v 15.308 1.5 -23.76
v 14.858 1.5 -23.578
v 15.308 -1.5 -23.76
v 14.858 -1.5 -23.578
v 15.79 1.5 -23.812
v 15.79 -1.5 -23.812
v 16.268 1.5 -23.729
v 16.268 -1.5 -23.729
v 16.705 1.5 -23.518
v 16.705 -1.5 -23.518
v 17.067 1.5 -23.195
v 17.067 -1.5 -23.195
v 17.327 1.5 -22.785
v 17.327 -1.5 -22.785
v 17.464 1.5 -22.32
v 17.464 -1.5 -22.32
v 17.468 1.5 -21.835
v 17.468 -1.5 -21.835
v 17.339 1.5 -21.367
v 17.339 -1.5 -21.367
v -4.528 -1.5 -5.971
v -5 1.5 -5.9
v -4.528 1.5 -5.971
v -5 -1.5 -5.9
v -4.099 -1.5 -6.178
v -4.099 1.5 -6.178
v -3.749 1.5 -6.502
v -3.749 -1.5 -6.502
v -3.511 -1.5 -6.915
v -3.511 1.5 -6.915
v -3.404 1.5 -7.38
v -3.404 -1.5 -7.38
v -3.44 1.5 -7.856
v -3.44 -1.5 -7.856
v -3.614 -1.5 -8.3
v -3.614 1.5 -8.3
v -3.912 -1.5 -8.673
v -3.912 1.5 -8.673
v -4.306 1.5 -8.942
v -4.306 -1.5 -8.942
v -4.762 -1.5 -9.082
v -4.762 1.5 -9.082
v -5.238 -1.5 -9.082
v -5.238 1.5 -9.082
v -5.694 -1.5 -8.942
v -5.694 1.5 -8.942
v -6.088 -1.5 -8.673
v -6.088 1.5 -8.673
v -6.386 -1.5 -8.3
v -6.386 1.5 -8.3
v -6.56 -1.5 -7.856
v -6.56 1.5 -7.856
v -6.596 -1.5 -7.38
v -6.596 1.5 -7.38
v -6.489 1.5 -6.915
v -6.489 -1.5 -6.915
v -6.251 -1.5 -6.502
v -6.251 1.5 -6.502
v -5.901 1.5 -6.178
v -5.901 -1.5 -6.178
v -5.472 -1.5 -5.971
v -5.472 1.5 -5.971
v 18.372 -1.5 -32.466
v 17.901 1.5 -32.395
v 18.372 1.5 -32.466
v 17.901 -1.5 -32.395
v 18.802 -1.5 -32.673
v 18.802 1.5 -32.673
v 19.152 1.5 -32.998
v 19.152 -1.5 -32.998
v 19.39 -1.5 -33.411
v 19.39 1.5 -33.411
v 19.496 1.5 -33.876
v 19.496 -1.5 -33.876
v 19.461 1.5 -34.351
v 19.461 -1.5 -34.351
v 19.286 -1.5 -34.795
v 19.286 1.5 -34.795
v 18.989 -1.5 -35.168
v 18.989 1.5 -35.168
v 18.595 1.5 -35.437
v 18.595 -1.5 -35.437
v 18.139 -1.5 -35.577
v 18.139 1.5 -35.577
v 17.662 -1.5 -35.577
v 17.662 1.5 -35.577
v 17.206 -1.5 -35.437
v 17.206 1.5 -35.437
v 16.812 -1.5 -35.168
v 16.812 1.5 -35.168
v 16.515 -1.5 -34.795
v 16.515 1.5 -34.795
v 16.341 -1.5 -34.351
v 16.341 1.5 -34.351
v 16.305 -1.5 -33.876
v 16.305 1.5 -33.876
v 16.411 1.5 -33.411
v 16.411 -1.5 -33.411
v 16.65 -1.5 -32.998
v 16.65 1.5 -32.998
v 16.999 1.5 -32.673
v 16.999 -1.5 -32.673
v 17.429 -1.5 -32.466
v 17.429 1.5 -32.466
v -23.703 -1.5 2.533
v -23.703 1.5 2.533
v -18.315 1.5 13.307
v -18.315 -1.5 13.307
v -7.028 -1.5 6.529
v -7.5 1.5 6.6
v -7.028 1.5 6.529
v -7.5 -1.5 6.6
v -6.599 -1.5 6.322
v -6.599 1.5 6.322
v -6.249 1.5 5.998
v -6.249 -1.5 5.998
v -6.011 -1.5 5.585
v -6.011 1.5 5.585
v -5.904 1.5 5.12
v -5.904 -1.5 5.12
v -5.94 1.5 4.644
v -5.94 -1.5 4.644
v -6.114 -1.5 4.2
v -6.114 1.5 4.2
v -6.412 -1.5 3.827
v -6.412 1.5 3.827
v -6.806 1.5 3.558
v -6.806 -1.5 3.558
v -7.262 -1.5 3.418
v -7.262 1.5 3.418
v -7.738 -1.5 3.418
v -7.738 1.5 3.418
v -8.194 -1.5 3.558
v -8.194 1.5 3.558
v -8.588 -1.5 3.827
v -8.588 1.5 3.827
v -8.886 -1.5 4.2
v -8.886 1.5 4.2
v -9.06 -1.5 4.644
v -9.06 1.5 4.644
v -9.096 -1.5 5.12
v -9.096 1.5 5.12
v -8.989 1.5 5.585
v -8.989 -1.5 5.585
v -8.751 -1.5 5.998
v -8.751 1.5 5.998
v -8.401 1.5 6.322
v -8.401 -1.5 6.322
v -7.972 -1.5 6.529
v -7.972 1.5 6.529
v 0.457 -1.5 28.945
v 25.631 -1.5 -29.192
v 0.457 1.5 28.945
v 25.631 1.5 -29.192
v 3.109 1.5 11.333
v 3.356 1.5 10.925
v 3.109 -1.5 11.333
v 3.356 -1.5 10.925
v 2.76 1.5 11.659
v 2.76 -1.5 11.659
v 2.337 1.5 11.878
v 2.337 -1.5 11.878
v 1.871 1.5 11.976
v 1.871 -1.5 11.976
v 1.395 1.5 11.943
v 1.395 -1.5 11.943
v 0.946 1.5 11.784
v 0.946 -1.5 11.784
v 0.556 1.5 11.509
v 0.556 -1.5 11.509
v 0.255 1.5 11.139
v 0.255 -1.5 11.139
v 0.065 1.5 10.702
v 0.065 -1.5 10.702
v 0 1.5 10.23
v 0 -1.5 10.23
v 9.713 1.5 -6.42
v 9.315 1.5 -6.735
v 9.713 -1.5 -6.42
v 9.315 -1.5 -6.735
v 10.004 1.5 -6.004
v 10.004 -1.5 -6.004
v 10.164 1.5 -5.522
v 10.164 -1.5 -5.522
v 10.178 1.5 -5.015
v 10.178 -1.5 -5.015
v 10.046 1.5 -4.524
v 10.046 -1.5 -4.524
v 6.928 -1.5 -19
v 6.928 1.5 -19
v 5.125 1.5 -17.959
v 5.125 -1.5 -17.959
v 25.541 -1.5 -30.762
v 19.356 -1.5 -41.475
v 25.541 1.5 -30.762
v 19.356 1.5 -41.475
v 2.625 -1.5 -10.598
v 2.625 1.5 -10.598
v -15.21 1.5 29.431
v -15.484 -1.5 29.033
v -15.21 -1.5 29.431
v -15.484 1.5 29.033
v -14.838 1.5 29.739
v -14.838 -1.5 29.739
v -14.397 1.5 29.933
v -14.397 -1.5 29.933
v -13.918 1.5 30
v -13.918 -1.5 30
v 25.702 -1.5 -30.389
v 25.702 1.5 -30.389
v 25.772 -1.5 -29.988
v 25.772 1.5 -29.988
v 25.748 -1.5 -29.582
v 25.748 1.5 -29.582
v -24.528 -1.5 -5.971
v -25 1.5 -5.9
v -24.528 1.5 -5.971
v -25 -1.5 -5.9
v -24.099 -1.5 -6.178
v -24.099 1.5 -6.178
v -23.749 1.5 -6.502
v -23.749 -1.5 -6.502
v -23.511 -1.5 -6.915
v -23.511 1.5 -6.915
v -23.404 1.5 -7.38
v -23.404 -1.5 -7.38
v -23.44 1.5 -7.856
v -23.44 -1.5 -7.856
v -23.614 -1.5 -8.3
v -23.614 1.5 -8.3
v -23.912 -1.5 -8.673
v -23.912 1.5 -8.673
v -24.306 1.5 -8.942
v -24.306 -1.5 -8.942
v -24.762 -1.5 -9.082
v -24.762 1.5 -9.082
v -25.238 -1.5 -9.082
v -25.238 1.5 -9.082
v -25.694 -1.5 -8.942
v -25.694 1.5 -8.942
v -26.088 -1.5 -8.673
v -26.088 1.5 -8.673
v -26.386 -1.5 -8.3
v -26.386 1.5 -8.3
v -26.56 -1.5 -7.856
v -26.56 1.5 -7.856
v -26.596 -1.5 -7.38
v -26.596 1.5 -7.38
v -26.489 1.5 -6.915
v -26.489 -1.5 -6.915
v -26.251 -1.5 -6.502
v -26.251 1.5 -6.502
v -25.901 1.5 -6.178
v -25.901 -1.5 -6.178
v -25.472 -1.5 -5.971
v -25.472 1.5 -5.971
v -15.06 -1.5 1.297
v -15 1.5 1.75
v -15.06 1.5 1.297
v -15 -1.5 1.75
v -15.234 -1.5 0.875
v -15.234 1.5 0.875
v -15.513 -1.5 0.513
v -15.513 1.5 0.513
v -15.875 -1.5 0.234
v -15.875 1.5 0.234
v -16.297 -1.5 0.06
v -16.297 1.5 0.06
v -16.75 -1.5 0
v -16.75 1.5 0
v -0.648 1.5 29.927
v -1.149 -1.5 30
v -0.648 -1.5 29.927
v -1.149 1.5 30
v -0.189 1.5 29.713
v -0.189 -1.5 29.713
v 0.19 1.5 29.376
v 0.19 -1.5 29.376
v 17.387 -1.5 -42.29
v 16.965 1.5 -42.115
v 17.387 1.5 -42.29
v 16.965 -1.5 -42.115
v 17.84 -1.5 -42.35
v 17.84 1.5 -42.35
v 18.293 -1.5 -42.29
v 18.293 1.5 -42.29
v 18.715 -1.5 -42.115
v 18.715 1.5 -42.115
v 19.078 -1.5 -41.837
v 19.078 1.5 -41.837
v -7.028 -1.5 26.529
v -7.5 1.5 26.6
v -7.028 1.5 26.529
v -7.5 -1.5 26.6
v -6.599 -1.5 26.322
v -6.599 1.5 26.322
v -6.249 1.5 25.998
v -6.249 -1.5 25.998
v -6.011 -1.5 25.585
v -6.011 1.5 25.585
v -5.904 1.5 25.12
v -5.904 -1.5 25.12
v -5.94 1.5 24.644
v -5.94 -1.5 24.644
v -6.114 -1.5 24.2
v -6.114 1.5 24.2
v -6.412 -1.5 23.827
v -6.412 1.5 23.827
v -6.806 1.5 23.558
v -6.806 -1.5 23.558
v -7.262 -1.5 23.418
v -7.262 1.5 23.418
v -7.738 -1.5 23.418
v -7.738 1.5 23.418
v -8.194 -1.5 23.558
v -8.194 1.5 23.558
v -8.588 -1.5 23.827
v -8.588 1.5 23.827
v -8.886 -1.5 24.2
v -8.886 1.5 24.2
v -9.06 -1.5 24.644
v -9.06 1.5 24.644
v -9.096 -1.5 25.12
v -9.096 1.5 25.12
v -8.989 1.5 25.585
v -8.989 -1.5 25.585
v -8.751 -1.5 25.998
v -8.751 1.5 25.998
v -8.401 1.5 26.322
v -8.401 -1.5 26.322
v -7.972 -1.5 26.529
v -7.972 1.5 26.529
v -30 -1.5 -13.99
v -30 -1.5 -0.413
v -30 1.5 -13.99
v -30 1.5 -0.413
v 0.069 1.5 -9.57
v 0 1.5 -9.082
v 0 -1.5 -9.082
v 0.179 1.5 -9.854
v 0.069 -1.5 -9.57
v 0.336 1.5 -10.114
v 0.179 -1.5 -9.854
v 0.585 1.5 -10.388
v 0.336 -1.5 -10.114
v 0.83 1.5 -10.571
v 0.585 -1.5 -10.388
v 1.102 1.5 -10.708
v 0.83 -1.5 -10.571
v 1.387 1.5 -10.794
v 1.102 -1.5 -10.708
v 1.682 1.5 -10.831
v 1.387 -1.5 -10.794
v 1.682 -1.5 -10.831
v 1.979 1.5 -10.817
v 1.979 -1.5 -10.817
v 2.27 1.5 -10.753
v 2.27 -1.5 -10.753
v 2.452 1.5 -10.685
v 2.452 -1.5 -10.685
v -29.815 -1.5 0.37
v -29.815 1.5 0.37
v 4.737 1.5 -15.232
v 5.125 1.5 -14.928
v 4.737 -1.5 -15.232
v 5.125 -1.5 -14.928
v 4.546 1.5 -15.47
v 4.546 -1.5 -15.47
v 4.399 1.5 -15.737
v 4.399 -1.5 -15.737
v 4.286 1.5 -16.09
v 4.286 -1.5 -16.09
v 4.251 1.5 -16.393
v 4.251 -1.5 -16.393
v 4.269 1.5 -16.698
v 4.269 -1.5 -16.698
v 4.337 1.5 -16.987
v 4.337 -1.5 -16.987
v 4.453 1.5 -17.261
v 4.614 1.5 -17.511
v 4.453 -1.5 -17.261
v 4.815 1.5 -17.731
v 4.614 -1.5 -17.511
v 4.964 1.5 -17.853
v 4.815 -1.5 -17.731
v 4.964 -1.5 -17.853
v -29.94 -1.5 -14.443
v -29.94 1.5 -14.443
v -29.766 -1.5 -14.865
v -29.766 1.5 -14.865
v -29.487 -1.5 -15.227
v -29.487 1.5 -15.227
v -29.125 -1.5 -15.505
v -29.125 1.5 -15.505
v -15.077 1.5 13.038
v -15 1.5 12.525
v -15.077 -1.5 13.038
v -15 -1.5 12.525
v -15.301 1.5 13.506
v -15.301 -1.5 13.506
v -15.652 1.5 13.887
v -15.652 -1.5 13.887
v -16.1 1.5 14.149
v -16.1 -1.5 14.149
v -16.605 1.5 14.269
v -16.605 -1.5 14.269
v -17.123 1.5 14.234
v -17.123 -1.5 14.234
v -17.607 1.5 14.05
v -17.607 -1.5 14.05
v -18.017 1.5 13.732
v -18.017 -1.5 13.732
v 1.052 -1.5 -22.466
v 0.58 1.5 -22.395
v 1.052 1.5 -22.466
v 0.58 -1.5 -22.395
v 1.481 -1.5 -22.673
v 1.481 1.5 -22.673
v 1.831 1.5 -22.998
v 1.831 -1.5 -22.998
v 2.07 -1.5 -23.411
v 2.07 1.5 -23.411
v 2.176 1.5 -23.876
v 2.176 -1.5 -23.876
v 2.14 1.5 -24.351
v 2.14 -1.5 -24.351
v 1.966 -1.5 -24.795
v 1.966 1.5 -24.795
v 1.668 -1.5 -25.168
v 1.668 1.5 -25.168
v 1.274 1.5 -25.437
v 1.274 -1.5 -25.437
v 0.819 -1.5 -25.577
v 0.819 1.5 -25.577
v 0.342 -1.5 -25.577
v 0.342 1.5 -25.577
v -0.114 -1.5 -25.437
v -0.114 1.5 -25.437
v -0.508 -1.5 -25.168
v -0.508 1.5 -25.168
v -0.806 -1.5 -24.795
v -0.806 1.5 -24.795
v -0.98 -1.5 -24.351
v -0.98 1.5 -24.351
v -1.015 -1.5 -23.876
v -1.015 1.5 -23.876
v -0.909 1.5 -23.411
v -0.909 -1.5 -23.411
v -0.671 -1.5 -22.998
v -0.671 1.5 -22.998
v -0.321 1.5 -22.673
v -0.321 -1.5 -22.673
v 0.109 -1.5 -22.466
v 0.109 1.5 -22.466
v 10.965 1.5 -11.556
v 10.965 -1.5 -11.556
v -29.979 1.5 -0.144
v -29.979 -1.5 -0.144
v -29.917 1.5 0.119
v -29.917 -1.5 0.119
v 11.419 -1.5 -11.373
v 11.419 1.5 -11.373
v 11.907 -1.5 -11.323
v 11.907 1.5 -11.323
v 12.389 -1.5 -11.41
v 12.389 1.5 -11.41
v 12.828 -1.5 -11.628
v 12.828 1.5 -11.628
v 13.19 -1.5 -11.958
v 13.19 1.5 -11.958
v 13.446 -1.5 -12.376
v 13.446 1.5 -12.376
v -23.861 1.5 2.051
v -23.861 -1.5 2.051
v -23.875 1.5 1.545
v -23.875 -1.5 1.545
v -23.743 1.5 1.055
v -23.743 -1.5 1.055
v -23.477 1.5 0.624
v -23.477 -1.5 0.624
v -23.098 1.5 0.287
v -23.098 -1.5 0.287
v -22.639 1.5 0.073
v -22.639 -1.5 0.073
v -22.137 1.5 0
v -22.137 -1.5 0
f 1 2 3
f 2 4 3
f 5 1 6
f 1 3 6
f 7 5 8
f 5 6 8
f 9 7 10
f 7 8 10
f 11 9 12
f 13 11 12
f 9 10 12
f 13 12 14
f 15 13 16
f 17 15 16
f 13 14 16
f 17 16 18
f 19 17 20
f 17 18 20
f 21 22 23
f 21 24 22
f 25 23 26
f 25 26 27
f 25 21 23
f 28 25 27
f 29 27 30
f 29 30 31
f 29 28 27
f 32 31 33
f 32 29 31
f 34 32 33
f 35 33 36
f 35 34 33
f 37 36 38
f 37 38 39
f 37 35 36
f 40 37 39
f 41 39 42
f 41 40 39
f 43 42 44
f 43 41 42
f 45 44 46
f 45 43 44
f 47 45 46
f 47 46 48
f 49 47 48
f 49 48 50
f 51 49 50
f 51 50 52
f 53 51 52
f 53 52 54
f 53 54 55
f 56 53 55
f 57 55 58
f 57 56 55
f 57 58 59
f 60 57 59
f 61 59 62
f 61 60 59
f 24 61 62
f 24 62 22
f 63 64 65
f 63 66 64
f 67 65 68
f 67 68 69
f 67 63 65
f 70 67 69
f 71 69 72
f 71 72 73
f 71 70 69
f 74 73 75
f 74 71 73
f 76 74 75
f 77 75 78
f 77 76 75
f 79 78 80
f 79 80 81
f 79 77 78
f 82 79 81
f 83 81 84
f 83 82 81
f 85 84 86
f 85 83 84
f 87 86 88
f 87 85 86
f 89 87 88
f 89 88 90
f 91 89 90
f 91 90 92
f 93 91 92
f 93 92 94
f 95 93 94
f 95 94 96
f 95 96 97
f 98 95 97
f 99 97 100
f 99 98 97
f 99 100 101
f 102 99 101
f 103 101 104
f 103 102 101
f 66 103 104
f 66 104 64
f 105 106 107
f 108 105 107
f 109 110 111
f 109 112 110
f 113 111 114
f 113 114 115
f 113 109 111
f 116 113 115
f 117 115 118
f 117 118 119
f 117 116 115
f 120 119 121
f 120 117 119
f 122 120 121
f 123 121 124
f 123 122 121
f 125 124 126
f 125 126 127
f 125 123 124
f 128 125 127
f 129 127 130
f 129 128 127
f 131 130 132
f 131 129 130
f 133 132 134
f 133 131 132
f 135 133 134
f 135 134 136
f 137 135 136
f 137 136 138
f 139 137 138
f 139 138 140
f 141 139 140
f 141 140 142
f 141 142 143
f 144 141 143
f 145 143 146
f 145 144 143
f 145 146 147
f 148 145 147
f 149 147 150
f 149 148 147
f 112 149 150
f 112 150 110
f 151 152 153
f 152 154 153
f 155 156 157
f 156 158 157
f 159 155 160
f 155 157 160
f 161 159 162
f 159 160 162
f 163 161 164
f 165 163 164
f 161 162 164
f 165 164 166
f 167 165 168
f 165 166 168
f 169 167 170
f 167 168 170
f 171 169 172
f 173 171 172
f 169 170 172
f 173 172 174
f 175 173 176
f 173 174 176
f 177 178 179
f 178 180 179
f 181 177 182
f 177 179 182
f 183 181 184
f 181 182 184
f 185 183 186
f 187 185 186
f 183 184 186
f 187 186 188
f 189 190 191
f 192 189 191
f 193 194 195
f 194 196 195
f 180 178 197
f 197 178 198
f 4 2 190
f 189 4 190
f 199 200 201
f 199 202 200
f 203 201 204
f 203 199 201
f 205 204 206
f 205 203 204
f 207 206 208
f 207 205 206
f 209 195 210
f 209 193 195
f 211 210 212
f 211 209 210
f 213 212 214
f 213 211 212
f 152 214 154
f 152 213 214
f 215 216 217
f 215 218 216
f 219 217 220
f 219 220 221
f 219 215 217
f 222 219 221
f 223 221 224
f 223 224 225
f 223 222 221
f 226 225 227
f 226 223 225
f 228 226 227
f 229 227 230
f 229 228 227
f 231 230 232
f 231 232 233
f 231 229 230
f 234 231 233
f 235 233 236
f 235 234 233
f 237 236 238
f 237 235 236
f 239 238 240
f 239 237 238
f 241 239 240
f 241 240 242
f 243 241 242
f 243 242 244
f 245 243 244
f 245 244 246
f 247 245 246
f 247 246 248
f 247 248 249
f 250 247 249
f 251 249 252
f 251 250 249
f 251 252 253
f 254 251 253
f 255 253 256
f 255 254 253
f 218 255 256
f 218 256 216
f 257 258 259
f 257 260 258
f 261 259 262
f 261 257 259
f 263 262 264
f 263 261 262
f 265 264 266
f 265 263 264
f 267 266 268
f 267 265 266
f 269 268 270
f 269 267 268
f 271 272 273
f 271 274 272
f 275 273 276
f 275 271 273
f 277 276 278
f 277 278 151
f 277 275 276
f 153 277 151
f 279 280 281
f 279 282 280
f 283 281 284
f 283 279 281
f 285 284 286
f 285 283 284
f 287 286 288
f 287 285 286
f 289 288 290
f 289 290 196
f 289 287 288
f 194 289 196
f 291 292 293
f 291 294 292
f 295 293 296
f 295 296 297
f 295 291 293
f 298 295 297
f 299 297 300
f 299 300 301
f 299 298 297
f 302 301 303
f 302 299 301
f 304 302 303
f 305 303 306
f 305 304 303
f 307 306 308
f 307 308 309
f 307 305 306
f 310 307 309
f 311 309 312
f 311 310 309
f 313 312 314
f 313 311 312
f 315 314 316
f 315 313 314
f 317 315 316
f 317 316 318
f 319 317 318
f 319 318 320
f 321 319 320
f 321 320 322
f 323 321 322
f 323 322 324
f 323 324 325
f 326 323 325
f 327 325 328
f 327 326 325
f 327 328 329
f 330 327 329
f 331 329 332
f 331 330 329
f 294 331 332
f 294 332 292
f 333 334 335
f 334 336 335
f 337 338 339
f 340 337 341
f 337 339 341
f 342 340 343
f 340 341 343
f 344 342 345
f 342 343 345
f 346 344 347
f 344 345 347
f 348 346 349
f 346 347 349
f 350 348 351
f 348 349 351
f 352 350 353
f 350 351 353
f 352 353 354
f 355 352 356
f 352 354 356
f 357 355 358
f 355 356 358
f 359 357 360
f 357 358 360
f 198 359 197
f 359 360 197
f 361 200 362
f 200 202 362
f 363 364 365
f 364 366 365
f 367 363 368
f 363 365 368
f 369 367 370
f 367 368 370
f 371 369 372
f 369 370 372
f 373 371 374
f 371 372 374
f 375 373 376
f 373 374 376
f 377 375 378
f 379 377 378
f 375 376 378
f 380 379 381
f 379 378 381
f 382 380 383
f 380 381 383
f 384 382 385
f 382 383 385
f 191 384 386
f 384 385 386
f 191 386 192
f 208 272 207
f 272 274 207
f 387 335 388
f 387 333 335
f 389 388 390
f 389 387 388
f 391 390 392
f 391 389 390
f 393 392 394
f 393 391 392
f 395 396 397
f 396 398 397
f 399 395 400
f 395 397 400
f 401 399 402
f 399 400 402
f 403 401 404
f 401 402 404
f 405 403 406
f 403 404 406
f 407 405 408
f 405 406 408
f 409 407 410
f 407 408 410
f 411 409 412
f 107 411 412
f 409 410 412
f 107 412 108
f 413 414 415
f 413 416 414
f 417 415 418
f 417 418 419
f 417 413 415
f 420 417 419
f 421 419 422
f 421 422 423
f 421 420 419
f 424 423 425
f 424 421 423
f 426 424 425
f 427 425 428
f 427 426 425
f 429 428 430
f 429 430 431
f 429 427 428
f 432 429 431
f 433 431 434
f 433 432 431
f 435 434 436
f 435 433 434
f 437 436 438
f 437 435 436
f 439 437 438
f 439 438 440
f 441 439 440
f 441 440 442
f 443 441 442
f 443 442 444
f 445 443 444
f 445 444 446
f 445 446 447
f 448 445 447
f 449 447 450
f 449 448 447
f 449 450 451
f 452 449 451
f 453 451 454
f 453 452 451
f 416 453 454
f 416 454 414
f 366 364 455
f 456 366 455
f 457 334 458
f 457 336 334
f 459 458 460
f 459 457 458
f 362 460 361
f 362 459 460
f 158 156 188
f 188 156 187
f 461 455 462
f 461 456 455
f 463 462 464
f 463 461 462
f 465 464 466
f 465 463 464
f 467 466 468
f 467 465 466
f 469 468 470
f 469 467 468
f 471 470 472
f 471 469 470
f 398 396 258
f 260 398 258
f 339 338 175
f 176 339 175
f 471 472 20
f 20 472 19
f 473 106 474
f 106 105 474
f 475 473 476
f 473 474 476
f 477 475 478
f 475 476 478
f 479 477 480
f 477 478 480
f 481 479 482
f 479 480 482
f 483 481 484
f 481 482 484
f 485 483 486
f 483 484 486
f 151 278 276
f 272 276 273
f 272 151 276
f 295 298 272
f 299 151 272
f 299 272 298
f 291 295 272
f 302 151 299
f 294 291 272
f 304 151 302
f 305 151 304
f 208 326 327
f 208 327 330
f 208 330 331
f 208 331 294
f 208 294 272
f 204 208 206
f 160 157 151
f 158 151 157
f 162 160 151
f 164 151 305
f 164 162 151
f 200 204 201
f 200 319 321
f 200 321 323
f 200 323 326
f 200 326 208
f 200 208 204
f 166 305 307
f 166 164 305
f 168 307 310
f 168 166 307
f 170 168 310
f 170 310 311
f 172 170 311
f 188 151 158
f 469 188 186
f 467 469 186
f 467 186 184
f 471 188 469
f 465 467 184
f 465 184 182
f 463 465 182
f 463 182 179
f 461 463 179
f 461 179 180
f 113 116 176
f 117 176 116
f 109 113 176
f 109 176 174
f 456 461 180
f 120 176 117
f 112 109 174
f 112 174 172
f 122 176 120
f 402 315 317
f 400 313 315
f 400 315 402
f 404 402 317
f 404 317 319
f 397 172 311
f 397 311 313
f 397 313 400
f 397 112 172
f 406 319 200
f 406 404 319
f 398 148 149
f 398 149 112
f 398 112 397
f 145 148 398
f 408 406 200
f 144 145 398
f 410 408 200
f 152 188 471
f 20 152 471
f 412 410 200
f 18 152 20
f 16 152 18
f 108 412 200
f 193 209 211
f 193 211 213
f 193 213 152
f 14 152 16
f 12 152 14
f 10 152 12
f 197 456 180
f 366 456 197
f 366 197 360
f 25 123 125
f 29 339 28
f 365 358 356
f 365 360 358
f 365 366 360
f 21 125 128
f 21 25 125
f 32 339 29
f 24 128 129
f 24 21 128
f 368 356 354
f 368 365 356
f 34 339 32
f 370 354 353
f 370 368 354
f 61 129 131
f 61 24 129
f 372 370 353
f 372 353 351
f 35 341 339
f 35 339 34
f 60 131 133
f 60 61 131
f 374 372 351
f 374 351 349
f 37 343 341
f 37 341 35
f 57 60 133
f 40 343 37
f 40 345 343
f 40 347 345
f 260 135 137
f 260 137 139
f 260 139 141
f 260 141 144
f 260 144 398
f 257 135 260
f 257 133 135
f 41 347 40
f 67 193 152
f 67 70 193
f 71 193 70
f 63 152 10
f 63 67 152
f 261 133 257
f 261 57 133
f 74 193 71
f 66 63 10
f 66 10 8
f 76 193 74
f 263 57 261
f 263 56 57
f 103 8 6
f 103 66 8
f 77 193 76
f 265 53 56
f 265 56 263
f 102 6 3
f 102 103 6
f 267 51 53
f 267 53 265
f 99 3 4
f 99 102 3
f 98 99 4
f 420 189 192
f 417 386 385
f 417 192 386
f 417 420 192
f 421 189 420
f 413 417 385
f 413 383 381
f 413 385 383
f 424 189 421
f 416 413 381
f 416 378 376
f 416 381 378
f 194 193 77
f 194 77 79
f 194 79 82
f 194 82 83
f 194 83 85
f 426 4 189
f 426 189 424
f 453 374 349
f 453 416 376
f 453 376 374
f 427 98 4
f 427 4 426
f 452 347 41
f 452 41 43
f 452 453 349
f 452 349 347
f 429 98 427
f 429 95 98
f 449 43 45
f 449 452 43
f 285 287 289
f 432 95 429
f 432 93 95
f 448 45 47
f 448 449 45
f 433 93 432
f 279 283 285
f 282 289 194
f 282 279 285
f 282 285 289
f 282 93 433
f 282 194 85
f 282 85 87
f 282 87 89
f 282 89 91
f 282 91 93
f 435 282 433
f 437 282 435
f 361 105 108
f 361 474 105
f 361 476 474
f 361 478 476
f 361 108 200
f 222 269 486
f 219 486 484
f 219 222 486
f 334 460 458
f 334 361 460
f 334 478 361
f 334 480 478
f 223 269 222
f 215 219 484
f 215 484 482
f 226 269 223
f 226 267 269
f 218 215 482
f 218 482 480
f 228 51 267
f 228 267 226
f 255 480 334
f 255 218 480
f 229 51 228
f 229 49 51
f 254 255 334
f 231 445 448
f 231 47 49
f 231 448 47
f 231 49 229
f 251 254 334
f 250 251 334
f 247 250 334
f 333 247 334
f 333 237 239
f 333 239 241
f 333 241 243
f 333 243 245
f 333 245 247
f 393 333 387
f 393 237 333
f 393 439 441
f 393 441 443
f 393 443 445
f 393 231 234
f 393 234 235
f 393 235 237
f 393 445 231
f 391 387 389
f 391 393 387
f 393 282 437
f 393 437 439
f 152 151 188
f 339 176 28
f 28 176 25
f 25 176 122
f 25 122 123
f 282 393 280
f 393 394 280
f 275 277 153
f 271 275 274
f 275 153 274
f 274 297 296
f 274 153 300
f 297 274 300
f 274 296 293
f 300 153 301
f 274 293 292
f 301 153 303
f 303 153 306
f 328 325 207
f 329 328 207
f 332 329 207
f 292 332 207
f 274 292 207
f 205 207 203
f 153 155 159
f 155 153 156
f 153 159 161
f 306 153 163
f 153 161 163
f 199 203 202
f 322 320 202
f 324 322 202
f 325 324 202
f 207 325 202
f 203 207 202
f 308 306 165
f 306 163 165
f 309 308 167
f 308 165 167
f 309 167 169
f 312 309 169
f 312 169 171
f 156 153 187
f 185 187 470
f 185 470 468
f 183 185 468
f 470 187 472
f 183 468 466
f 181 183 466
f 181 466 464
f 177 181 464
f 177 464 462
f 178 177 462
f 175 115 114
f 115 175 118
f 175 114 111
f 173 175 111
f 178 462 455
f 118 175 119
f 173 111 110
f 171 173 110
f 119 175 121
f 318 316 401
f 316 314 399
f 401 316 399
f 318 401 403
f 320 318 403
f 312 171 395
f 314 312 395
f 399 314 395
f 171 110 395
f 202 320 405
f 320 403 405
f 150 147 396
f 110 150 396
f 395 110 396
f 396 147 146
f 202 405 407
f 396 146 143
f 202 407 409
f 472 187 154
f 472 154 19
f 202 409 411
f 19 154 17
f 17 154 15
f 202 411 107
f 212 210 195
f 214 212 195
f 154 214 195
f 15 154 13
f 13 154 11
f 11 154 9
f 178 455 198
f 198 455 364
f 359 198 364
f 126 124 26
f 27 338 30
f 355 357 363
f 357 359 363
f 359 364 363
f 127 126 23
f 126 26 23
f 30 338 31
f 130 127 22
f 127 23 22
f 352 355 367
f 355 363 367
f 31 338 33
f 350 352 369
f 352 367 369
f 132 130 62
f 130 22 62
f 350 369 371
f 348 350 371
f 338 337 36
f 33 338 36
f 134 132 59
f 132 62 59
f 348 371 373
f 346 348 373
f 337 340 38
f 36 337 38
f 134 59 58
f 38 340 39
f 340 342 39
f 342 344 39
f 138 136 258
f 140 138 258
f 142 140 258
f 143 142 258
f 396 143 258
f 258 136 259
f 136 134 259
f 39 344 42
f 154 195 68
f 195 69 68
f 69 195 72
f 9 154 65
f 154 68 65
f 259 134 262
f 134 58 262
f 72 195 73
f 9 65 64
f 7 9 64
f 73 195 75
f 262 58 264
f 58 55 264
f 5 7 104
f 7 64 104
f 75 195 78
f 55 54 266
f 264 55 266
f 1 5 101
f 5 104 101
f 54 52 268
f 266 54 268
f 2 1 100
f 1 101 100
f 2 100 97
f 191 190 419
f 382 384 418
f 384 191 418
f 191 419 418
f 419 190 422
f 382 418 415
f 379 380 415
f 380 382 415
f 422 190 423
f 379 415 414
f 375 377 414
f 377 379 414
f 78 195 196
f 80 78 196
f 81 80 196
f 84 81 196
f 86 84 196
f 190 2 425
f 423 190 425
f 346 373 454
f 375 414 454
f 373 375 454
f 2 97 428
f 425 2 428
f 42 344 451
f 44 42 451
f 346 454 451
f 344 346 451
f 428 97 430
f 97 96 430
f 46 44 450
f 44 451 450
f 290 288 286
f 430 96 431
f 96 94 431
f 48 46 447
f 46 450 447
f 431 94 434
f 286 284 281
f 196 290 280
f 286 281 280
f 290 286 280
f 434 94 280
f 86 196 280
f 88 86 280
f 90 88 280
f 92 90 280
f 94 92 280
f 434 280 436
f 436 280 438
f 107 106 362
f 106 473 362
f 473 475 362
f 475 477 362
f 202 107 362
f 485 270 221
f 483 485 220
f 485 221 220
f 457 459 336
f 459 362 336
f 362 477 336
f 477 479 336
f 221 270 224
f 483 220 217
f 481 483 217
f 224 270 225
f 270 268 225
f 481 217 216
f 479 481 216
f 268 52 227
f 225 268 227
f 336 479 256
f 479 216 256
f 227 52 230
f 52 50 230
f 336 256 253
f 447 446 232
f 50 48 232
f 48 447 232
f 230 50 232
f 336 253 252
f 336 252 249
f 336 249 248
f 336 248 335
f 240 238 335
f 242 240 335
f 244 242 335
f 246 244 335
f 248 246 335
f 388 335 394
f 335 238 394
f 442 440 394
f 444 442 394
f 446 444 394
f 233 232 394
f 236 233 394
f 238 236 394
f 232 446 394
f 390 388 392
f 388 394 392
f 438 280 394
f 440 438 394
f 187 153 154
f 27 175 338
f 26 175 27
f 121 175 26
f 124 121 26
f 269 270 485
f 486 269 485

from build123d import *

# Parameters (mm, degrees)
SKETCH_4_R          = 1.6
EXTRUDE_1_DEPTH     = 1.5
CUT_EXTRUDE_2_DEPTH = 3
FILLET_2_R          = 1.75


with BuildPart() as part:
    # ｽｹｯﾁ4 → ﾎﾞｽ - 押し出し1 (new, symmetric)
    with BuildSketch(Plane(origin=(0, 0, 0), x_dir=(1, 0, 0), z_dir=(0, 1, 0))):
        Polygon((-30, 0), (-30, 15), (18.480762114, 42.990381057), (25.980762114, 30), (0, -30), (-15, -30), align=None)
        with Locations(Location((0.580127019, 23.995190528, 0), (0, 0, 270))):
            Circle(SKETCH_4_R, mode=Mode.SUBTRACT)
        with Locations(Location((-5, 7.5, 0), (0, 0, 270))):
            Circle(SKETCH_4_R, mode=Mode.SUBTRACT)
        with Locations(Location((-7.5, -5, 0), (0, 0, 270))):
            Circle(SKETCH_4_R, mode=Mode.SUBTRACT)
        with Locations(Location((-7.5, -25, 0), (0, 0, 270))):
            Circle(SKETCH_4_R, mode=Mode.SUBTRACT)
        with Locations(Location((-25, 7.5, 0), (0, 0, 270))):
            Circle(SKETCH_4_R, mode=Mode.SUBTRACT)
        with Locations(Location((17.900635095, 33.995190528, 0), (0, 0, 270))):
            Circle(SKETCH_4_R, mode=Mode.SUBTRACT)
    extrude(amount=EXTRUDE_1_DEPTH, both=True)

    # ｽｹｯﾁ5 → ｶｯﾄ - 押し出し2 (cut)
    with BuildSketch(Plane(origin=(0, 1.5, 0), x_dir=(1, 0, 0), z_dir=(0, 1, 0))):
        Polygon((12.665448219, 10.574351407), (19.442413698, 26.225082782), (6.92820323, 19), (4.714101615, 15.165063509), align=None)
        Polygon((4.714101615, 15.165063509), (6.92820323, 19), (2.5, 16.443375673), align=None)
        Polygon((2.214101615, 10.834936491), (0, 12.113248654), (0, 7), align=None)
        Polygon((0, 0), (0, -18.675248347), (10.665448219, 5.955549254), (2.214101615, 10.834936491), (0, 7), align=None)
        Polygon((-15, 0), (-24.968847051, 0), (-15, -19.937694101), align=None)
    extrude(amount=-CUT_EXTRUDE_2_DEPTH, mode=Mode.SUBTRACT)

    # ﾌｨﾚｯﾄ2
    fillet_2_edges = [part.edges().sort_by_distance(p)[0] for p in [
        (-30, 0, 0),
        (-30, 0, -15),
        (18.480762114, 0, -42.990381057),
        (25.980762114, 0, -30),
        (0, 0, 30),
        (-15, 0, 30),
        (-24.968847051, 0, 0),
        (-15, 0, 0),
        (-15, 0, 19.937694101),
        (0, 0, 18.675248347),
        (0, 0, -12.113248654),
        (10.665448219, 0, -5.955549254),
        (2.5, 0, -16.443375673),
        (19.442413698, 0, -26.225082782),
        (12.665448219, 0, -10.574351407),
    ]]
    fillet(fillet_2_edges, radius=FILLET_2_R)


solid = part.part
